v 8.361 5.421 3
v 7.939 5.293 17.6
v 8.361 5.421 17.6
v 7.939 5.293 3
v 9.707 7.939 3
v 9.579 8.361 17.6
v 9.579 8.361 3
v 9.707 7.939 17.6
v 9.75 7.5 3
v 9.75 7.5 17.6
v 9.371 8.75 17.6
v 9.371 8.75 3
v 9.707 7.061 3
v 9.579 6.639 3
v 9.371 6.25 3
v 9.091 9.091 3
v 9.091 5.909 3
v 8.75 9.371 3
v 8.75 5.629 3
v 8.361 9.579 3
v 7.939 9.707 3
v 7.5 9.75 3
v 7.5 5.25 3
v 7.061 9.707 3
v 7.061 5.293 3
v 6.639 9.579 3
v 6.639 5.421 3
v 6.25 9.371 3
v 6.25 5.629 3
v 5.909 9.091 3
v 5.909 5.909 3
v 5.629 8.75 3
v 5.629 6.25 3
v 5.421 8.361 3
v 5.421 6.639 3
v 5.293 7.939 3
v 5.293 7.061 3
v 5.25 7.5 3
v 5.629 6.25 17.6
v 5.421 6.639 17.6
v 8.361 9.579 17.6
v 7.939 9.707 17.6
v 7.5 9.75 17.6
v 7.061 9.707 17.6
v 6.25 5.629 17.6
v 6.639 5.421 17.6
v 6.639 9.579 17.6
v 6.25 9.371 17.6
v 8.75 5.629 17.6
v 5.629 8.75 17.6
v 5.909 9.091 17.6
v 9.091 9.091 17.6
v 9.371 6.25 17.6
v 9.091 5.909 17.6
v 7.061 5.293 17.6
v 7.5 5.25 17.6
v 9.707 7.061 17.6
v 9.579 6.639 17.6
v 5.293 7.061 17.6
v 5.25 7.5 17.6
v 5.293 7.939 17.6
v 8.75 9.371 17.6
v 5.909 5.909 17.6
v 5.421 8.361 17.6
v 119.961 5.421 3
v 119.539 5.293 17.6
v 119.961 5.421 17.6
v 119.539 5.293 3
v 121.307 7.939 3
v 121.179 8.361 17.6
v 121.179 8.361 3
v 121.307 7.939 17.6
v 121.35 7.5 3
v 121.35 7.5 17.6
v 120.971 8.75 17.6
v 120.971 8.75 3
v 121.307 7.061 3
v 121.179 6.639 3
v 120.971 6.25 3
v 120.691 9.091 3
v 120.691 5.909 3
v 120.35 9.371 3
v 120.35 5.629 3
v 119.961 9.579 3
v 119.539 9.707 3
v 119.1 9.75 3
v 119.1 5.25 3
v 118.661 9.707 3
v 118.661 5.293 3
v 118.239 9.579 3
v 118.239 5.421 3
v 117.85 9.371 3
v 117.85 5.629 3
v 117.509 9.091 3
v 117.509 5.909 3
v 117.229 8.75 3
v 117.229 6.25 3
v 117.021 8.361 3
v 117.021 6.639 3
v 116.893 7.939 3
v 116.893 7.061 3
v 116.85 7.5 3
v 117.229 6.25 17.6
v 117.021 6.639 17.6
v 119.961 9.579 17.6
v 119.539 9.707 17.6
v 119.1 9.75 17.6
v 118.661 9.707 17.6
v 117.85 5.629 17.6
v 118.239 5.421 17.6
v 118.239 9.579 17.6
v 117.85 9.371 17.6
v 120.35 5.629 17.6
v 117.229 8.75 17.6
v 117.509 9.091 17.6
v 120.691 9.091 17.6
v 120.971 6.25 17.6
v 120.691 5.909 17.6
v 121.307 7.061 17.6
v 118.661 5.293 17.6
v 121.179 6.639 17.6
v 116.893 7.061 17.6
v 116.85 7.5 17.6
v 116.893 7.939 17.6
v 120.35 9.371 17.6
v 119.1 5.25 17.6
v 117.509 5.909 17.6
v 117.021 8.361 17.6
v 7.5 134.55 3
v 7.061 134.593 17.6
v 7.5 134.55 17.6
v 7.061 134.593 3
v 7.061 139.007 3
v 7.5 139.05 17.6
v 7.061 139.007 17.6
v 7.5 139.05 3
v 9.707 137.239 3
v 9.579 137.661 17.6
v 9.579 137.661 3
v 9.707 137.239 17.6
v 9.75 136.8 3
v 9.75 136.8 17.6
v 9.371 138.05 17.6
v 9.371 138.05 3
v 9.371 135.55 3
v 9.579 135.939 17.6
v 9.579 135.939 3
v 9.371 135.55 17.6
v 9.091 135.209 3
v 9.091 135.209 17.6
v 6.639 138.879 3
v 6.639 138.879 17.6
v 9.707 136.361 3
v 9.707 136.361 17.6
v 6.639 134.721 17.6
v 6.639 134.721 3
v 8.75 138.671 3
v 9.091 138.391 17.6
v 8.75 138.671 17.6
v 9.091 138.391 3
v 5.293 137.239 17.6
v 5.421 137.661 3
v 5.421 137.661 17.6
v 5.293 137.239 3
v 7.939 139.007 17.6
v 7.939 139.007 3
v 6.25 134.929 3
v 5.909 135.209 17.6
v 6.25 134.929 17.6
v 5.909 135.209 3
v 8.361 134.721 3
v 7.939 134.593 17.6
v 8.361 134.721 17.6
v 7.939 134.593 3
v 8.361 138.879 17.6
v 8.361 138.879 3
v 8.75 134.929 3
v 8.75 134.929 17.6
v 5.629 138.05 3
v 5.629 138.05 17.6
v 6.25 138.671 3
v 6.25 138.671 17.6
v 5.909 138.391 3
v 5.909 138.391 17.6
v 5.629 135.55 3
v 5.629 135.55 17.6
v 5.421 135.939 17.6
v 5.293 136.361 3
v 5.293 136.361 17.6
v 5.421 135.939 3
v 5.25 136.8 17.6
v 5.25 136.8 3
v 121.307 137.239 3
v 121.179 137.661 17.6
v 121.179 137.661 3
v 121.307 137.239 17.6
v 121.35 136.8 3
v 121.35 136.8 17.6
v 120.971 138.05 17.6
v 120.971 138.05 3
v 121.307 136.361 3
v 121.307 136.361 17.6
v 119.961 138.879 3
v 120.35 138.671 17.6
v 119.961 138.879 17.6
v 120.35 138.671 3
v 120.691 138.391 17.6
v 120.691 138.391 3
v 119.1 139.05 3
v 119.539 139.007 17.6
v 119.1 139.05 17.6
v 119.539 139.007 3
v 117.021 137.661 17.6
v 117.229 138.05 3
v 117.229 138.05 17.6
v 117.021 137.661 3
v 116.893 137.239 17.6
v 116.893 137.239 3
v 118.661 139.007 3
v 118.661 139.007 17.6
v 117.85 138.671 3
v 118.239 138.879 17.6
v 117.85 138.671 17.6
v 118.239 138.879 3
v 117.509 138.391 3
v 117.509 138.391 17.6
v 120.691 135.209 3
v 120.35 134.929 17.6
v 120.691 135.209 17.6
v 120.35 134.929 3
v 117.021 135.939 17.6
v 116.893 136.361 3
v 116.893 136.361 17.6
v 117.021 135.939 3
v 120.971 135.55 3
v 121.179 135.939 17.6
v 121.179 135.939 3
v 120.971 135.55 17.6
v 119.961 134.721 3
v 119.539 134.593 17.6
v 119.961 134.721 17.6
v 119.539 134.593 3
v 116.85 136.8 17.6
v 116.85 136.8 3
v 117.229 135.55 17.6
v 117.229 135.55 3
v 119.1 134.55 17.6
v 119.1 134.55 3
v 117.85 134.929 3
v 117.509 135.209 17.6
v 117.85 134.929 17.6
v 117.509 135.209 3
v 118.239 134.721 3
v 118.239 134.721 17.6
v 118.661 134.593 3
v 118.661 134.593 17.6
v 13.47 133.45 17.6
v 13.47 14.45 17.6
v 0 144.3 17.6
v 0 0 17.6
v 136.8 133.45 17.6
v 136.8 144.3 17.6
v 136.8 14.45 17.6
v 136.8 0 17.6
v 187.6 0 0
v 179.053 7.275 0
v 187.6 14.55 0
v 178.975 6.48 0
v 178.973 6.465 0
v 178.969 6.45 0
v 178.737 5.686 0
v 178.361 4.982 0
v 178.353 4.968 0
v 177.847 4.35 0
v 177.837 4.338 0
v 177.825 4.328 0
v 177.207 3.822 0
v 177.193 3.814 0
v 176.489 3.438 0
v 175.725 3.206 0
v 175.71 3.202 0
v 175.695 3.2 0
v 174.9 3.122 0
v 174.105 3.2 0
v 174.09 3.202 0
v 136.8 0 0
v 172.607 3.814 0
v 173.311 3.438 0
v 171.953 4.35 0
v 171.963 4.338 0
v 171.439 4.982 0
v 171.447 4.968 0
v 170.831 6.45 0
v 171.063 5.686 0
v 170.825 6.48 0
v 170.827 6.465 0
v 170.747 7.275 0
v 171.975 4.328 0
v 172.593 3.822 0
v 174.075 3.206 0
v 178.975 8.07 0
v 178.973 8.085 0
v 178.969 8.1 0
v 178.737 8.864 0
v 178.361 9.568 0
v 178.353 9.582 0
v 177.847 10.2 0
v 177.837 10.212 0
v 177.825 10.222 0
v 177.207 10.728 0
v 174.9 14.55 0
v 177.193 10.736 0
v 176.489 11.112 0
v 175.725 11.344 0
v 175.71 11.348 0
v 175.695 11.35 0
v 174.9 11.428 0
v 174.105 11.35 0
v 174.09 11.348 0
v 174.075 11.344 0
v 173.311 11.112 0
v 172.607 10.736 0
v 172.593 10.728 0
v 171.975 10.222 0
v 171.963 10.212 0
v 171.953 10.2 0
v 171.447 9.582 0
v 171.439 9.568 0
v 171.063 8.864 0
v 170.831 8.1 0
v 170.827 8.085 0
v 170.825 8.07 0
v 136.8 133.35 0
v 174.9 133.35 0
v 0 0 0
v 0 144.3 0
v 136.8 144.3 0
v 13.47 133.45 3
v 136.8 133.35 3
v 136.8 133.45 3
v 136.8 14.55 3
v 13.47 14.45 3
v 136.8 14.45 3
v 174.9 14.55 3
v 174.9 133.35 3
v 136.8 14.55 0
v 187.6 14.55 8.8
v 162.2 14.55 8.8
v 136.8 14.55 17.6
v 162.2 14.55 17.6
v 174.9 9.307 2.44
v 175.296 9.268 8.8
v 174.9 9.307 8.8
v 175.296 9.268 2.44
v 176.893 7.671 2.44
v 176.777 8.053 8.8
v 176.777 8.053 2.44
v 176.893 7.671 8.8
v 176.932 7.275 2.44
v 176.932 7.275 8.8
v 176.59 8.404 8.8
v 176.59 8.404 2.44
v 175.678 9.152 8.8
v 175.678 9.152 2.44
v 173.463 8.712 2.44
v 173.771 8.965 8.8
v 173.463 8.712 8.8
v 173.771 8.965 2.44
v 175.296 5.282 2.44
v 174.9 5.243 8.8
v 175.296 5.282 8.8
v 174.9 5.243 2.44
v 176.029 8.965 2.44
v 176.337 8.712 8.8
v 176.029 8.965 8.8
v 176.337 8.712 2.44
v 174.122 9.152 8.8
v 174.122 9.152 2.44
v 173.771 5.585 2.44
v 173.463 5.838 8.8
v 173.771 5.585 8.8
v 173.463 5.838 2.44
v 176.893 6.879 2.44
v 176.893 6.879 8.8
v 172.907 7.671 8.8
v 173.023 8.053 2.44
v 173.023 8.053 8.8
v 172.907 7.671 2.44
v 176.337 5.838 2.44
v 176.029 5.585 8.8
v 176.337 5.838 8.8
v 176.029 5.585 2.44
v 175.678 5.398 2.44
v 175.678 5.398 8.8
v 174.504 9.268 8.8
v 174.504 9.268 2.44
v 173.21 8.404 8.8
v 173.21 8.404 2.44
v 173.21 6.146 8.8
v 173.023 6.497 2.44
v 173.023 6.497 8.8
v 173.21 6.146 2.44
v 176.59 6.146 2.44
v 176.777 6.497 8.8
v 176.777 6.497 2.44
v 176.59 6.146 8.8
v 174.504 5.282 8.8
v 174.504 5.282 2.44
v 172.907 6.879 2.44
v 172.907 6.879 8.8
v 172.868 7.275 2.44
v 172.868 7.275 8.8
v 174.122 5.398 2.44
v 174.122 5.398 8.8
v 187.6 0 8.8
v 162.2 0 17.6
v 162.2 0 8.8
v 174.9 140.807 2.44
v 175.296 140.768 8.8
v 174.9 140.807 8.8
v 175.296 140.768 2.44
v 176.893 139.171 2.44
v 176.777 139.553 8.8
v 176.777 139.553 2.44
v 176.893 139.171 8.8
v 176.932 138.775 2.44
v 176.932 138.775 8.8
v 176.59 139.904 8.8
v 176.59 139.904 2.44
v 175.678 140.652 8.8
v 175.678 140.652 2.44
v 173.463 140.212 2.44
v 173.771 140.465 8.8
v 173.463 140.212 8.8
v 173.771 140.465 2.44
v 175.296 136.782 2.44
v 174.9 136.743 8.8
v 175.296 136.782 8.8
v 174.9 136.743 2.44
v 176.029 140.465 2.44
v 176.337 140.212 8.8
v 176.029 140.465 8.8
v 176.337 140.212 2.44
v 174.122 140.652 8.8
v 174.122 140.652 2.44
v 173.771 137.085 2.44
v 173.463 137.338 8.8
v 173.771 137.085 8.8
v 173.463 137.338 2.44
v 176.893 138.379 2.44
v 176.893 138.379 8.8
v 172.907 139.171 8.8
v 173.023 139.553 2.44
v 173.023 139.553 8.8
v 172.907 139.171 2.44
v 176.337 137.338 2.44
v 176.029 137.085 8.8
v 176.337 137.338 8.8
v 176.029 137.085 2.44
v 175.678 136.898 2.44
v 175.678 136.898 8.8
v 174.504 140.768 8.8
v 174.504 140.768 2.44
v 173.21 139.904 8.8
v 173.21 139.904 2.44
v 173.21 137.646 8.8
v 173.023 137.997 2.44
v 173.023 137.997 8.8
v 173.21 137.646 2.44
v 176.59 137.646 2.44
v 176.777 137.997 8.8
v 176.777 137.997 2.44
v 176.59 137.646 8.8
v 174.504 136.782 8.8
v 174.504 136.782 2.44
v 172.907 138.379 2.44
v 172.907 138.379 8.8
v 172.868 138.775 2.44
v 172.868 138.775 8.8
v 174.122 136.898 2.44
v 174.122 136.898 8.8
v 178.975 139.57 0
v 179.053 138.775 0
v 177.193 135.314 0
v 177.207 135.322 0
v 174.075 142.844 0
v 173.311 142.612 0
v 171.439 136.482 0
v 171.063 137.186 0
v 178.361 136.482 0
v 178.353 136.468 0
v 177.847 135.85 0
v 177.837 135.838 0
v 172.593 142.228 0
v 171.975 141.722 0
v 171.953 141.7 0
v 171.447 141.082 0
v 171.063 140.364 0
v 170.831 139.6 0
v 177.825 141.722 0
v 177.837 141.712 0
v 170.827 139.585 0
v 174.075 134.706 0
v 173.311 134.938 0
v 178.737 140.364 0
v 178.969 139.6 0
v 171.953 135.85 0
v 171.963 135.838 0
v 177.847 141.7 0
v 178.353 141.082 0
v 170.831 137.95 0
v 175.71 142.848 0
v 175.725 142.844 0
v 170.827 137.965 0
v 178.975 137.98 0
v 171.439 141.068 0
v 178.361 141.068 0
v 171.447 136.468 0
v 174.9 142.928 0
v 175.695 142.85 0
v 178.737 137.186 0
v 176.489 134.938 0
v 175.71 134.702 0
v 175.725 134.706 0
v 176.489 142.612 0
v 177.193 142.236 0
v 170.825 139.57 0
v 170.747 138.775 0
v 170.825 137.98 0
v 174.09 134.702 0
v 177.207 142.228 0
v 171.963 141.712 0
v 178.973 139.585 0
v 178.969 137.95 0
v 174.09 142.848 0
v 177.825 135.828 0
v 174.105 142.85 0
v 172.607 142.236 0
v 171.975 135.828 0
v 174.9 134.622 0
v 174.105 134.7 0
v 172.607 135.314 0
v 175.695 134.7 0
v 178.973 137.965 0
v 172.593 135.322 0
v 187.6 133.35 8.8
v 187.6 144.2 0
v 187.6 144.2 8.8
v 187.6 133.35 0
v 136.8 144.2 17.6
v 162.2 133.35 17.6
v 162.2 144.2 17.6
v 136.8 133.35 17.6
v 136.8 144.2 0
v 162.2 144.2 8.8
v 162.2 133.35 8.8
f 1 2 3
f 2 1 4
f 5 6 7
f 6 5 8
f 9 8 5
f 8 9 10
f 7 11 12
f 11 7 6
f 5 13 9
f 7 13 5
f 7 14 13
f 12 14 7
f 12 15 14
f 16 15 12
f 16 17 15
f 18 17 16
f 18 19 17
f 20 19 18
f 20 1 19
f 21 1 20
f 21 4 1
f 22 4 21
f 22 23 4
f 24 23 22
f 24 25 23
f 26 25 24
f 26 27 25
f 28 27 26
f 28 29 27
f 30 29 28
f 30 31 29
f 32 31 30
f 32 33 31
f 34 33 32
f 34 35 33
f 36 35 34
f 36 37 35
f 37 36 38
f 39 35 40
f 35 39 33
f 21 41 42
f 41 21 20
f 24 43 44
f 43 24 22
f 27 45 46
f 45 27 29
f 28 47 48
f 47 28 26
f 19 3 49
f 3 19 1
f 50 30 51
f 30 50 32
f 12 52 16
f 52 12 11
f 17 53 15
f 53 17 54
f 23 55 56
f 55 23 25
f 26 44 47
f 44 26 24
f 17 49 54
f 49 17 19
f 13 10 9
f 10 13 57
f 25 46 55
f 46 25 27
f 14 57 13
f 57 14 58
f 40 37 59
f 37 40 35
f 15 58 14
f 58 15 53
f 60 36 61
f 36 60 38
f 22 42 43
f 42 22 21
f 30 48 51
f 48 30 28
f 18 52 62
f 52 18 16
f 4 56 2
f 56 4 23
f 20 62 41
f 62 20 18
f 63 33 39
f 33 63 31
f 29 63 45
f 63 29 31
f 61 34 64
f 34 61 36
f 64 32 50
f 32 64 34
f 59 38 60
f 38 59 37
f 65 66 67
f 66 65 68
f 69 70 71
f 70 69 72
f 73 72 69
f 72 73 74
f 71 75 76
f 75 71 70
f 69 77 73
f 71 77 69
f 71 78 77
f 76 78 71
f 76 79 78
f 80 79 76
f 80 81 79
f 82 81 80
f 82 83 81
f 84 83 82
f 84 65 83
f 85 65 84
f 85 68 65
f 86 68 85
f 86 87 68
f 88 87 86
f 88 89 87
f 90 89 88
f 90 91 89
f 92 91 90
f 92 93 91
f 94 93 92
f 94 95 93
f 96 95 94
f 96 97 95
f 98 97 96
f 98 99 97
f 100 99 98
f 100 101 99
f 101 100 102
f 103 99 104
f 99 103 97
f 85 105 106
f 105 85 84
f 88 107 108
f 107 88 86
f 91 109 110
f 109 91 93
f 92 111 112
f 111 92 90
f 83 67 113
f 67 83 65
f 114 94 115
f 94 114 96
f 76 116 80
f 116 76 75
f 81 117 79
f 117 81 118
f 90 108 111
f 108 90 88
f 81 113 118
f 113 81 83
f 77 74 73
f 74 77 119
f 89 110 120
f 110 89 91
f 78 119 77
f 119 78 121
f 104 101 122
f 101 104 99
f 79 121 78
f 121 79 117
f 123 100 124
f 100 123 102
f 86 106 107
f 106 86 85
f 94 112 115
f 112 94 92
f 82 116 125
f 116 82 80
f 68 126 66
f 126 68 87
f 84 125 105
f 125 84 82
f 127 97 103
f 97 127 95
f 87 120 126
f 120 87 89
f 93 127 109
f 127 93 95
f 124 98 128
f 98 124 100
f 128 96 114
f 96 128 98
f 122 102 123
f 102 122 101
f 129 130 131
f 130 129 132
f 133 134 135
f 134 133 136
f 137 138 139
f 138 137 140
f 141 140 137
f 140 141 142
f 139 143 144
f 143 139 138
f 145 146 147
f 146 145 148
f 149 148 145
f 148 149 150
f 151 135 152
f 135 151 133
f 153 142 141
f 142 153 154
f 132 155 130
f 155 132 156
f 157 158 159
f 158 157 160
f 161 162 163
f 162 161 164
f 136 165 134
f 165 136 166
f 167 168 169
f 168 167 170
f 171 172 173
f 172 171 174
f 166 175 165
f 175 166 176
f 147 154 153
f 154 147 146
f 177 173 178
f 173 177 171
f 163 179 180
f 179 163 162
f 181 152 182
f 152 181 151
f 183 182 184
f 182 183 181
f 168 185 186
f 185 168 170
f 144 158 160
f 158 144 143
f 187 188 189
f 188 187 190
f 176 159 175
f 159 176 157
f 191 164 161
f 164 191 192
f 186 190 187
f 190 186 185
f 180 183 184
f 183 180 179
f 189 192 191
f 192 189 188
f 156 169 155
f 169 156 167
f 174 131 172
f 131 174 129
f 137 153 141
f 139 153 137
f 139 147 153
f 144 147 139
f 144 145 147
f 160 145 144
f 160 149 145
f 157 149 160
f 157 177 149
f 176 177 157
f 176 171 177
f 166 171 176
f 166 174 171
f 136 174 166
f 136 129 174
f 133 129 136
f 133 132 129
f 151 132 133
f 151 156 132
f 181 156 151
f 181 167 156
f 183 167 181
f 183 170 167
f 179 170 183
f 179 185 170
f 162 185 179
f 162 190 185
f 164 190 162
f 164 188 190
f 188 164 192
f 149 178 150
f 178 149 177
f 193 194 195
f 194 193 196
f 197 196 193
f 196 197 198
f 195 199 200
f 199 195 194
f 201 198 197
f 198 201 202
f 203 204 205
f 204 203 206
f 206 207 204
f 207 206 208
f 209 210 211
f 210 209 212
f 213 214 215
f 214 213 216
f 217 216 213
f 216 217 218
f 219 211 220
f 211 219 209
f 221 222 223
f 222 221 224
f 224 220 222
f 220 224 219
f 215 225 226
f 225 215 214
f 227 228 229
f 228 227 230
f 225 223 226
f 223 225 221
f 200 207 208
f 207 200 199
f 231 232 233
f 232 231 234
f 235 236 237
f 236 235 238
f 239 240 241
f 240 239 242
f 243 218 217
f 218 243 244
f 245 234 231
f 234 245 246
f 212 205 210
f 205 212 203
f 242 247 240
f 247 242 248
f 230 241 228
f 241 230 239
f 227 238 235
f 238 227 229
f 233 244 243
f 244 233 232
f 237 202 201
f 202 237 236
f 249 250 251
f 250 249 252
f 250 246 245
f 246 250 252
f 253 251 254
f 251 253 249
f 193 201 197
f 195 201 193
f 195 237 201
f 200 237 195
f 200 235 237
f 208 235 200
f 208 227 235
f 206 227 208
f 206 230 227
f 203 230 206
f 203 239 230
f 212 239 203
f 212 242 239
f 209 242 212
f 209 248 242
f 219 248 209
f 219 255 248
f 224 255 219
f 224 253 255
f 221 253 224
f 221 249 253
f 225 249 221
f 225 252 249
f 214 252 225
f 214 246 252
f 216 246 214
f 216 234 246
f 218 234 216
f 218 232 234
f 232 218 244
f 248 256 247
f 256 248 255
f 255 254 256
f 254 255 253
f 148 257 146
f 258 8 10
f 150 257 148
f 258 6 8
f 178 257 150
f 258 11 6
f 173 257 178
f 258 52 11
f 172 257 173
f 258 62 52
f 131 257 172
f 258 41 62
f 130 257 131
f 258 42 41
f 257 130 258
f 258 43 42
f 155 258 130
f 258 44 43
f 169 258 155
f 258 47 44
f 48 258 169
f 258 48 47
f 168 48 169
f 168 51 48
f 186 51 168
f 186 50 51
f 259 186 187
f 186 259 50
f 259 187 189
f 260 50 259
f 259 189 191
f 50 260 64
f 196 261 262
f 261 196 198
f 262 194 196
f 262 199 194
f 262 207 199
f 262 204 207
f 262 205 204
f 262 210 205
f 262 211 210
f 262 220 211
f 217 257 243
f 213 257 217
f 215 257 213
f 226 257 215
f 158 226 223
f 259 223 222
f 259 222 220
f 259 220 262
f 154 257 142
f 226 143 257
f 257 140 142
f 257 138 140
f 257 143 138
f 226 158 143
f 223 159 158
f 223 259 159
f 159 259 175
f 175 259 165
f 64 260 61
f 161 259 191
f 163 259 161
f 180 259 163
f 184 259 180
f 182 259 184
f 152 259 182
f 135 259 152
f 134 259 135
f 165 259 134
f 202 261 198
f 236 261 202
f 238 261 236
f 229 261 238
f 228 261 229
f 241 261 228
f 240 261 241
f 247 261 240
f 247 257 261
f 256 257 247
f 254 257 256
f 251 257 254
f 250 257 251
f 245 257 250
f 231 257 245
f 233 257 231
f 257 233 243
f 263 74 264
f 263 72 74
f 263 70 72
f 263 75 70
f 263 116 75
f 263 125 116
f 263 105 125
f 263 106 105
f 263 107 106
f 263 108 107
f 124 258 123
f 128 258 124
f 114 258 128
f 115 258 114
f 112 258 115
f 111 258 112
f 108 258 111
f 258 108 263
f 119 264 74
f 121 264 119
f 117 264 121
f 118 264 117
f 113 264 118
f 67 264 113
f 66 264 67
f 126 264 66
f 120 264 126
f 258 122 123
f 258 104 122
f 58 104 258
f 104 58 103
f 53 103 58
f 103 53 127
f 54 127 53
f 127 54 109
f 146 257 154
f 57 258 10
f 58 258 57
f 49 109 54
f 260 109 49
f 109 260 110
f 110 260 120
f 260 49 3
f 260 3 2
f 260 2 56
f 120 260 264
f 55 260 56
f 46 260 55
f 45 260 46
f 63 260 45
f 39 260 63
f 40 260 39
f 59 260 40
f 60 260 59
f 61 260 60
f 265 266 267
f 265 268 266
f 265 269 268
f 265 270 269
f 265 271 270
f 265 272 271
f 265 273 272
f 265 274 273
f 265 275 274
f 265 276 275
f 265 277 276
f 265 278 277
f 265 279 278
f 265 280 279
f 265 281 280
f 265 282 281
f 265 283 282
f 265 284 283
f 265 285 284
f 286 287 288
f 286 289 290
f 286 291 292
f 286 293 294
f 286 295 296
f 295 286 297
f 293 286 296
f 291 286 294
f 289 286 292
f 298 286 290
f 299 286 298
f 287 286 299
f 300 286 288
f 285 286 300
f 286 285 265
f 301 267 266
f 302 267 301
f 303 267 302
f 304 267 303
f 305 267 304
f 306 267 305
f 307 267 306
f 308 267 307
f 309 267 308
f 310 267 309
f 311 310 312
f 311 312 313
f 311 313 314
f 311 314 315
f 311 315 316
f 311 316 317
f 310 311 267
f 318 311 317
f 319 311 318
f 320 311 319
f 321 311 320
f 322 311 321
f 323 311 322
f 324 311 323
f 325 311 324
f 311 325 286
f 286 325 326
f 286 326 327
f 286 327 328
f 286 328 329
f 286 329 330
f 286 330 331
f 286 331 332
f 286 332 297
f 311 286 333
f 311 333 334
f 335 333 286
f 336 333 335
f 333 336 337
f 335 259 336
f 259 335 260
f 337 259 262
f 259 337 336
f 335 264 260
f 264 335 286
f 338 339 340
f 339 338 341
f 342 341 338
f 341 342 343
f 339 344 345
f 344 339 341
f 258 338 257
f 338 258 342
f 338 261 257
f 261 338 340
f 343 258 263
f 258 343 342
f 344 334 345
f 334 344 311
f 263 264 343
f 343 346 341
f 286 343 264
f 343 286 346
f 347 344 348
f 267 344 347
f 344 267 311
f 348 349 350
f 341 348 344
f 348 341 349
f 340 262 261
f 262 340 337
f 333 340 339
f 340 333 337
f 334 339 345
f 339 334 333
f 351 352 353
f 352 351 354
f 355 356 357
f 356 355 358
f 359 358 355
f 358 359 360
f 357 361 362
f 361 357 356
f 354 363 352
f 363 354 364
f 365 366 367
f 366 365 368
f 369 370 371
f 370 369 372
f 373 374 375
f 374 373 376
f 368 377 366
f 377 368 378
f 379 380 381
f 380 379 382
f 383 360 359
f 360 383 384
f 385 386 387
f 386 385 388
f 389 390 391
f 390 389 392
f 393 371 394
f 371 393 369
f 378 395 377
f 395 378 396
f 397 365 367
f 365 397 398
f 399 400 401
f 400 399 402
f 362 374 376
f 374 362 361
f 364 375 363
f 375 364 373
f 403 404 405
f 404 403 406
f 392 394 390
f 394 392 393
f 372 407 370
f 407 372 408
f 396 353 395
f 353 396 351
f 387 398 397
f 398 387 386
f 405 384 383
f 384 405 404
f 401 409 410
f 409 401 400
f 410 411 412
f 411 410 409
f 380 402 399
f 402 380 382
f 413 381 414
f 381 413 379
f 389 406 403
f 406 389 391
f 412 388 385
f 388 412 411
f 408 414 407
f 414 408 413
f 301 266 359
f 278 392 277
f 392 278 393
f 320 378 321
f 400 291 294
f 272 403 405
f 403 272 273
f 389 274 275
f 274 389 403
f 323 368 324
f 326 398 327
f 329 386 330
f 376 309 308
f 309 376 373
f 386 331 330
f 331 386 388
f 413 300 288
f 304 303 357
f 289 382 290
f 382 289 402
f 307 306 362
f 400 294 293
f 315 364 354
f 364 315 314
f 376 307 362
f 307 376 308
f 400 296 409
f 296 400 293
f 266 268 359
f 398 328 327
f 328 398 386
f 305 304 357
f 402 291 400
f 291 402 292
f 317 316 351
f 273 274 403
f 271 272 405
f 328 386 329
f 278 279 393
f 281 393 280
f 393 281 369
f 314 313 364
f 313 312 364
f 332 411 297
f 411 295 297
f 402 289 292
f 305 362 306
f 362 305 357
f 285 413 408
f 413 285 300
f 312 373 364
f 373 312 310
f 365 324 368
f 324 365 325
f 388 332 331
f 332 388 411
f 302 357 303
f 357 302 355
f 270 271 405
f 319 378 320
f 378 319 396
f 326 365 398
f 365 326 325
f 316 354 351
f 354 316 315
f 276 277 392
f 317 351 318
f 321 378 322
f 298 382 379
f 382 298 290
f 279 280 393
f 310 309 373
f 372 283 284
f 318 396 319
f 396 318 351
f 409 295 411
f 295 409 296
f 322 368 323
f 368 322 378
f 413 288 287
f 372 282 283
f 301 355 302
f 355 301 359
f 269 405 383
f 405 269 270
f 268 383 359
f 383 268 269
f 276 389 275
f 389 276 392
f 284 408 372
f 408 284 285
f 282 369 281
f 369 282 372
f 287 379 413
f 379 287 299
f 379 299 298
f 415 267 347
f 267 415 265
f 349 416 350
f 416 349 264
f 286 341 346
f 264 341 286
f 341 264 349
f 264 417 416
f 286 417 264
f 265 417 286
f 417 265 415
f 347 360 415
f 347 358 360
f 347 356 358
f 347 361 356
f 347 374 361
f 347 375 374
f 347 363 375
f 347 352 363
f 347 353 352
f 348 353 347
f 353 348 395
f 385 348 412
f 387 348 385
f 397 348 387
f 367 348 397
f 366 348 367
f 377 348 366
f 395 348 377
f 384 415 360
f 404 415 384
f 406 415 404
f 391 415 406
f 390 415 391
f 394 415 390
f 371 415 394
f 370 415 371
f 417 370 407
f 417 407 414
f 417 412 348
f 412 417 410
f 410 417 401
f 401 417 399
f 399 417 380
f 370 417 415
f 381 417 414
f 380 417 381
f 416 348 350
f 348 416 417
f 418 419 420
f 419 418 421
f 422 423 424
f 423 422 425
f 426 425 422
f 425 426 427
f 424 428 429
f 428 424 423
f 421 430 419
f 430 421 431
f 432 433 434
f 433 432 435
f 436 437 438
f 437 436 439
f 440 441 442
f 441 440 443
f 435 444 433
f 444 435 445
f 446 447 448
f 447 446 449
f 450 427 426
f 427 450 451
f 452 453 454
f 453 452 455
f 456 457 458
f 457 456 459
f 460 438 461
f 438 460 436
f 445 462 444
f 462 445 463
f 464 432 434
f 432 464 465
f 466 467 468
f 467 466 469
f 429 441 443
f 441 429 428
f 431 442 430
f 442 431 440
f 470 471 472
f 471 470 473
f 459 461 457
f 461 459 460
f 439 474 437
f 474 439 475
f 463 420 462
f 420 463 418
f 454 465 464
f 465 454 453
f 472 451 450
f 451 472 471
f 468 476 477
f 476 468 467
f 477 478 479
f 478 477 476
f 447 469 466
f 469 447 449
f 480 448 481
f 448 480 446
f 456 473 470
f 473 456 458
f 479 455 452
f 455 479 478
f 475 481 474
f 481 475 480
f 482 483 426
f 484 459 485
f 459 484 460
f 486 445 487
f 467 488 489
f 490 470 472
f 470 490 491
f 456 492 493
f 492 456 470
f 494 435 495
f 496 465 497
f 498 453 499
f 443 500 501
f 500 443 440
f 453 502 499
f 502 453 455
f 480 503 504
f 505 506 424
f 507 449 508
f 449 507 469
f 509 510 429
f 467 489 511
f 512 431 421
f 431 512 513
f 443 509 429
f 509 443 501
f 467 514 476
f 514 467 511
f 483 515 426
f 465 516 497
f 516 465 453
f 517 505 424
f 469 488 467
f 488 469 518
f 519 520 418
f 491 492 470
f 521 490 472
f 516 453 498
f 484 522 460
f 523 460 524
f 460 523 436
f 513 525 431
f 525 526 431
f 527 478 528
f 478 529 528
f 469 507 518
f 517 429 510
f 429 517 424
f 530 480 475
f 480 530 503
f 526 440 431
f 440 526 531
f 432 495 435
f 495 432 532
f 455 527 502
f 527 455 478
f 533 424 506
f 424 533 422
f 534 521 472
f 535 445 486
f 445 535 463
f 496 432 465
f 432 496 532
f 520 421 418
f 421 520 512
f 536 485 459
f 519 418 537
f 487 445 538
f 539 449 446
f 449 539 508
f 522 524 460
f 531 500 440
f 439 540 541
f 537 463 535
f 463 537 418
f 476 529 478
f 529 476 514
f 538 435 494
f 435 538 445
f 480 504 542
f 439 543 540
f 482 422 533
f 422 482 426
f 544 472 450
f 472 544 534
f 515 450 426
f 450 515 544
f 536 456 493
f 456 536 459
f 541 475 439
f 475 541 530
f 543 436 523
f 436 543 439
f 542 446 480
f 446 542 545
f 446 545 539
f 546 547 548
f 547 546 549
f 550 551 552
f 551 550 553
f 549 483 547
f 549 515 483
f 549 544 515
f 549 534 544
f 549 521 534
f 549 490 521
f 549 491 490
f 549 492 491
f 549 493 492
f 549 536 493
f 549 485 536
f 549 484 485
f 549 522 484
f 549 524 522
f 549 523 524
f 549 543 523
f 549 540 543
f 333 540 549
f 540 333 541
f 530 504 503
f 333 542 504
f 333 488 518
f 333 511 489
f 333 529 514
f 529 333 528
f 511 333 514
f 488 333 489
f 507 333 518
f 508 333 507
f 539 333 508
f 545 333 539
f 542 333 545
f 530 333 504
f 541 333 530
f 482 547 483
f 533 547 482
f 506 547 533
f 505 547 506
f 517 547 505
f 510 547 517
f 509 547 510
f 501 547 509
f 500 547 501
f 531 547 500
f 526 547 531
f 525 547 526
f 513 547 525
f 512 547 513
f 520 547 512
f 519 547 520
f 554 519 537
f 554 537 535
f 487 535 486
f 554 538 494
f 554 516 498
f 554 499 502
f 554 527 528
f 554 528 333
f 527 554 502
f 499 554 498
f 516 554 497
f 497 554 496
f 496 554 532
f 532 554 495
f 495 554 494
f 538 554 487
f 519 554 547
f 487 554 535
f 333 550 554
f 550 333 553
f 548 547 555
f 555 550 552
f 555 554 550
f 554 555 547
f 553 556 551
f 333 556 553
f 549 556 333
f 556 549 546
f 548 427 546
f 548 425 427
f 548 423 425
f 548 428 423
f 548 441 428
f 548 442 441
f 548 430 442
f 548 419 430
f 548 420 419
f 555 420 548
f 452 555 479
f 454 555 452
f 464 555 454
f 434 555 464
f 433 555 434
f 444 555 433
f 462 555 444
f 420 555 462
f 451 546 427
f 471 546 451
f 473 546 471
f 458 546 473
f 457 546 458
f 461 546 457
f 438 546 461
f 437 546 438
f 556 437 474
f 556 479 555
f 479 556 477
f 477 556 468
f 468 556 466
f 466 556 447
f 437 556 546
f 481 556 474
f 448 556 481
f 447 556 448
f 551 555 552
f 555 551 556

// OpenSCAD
// file: joint.scad
//
// create overlap joint
//
// joint( w, l, h, right, clear, tap)
//   create (one half of) an overlap joint with drilled holes
//
//   (w, l, h) are (x, y, z) size of entire joint
//   right=true specifies right size
//   (clear, tap) are hole diameters (thru hole from bottom on left side)
//
// (expects mm=25.4)

joint_e = 0.1;

joint_cs_dep = 0.1*mm;		/* countersink depth */
joint_cs_angle = 82;		/* countersink angle */

// make an "ell" for a joint
// size:  wid, leng, dep
// hole:  dia = diameter, outside=1 for start outside, pct = percent to drill
module joint_ell( wid, leng, dep, dia, outside, pct) {
     difference() {
	  cube( [wid, leng, dep]);
	  translate( [wid/2, -e, dep/2])
	       cube( [wid/2+joint_e, leng+2*e, dep/2+joint_e]);
	  // deal with the hole
	  if( outside) {
	       translate( [3*wid/4, leng/2, -e]) {
		    cylinder( d=dia, h = (((pct/2)+1)/100+joint_e)*dep);
		    // countersink
		    ang = 90-joint_cs_angle/2;
		    d_rad = joint_cs_dep/tan(ang);
		    cylinder( d1=dia+2*d_rad, d2=dia, h=joint_cs_dep);
	       }
	  } else {
	       translate( [3*wid/4, leng/2, (dep/2)*(((100-pct)+1)/100)-e])
		    cylinder( d=dia, h = dep/2+2*e);
	  }
     }
}

module joint_flip( wid, leng, dep, flip, dia, outside, pct) {
     if( flip ) {
	  joint_ell( wid, leng, dep, dia, flip, pct);
     } else {
	  translate( [wid, 0, dep])
	       rotate( [180, 0, 180])
	       joint_ell( wid, leng, dep, dia, flip, pct);
     }
}

module joint( w, l, h, right, clear, tap) {
     if( right) {
	  joint_flip(2*w/3, l, h, true, clear, 1, 100);
     } else {
	  joint_flip( 2*w/3, l, h, false, tap, 0, 75);
     }
}
// main file
//
// 84 key keyboard case
//

mm = 25.4;
$fn = 32;
e = 0.1;

include <joint.scad>

hgt = 5.1;  // plate height

// set to 0 for normal size
//shrink_x = 270;
//shrink_y = 100;
shrink_x = 0;
shrink_y = 0;

// plate dims from DXF
pwid = 344.8-shrink_x;
plen = 139.3-shrink_y;
pthk = 1.5;			/* thickness CHECKME */

hole_off = 5;			/* hole offset from edge */
hole_dx = 111.6;
hole_dia = 4.5;			/* 8-32 clearance hole */

// holes for #6 screws to join case halves
clear = 0.16*mm;
tap = 0.125*mm;

// pcb dims from layout
pcb_wid = 323-shrink_x;
pcb_len = 117-shrink_y; 
pcb_thk = 1.6;

case_pcb_clear = 1;

// position of lower left switch WRT item LL corner
pcb_ll_x = 29.94;
pcb_ll_y = 11.57;
plate_ll_x = 41.91;
plate_ll_y = 24.52;

case_pcb_dx = plate_ll_x - pcb_ll_x;
case_pcb_dy = plate_ll_y - pcb_ll_y;


// case details
case_A = 2.5;			/* case extend beyond plate */
case_B = 1;			/* clearance around PCB */
case_D = 3;			/* base thickness */
case_E = 8;			/* PCB clearance */

// overall case size
case_wid = pwid + 2*case_A;
case_len = plen + 2*case_A;
case_hgt = case_D + case_E + pcb_thk + 5;

// top and bottom case margins for joints
case_bot_marg = case_pcb_dy-case_pcb_clear+case_A;
case_top_marg = case_len-(pcb_len+2*case_pcb_clear)-case_bot_marg;

echo("Top Marg: ", case_top_marg);

module case() {
     translate( [case_A, case_A, 0])
	  difference() {
	       translate( [-case_A, -case_A, 0])
		    cube( [case_wid, case_len, case_hgt]);
	       translate( [case_pcb_dx-case_pcb_clear, case_pcb_dy-case_pcb_clear, case_D])
		    cube( [pcb_wid + 2*case_pcb_clear, pcb_len + 2*case_pcb_clear, 20]);
	       translate( [0, 0, case_D])
		    mtg_holes();

	  }
//     }
}

// draw real plate or fake plate if shrinking
module plate() {
     if( shrink_x == 0) {
	  translate( [case_A-38, case_A+plen+35, pcb_thk+5+(case_E+case_D)])
	       import("plate.stl",10);
     } else {
	  translate( [case_A, case_A, pcb_thk+5+(case_E+case_D)]) 
	  cube( [pwid, plen, pthk]);
     }
}

module board() {
     if( shrink_x == 0) {
	  translate( [case_A-15.1, case_A+plen+35.1, case_E+case_D])
	       import("kb_test_big.stl",10);
     } else {
	  translate( [case_A+case_pcb_dx, case_A+case_pcb_dy, case_E+case_D])
	  cube( [pcb_wid, pcb_len, pcb_thk]);
     }
}

module hole_at(x,y) {
     translate( [x, y, 0])
	  cylinder( d=hole_dia, h=40);
}

module mtg_holes() {
     for( y=[hole_off, plen-hole_off]) {
	  hole_at( hole_off, y);
	  hole_at( hole_off+hole_dx, y);
	  hole_at( hole_off+2*hole_dx, y);
	  hole_at( pwid-hole_off, y);
     }
}


module render() {
     color("lightblue") plate();
     color("brown") board();
     % case();
}

// test joint
//  color("blue") joint( w, l, h, false, clear, tap);
//  color("red")  joint( w, l, h, true, clear, tap);

module case_split( right) {
     difference() {
	  case();
	  if( right) {
	       translate( [-e, -e, -e])
		    cube( [case_wid/2+2*e, case_len+2*e, case_hgt+2*e]);
	  } else {
	       translate( [case_wid/2, -e, -e])
		    cube( [case_wid/2+2*e, case_len+2*e, case_hgt+2*e]);
	  }
     }
}

joint_wid = 3*mm;

module case_right_joint() {
     difference() {
	  case_split( true);
	  translate( [case_wid/2-(joint_wid/6), -e, -e])
	       cube( [joint_wid*2/3, case_bot_marg+2*e, case_hgt+2*e]);
	  translate( [case_wid/2-(joint_wid/6), case_len-case_top_marg-e, -e])
	       cube( [joint_wid*2/3, case_top_marg+2*e, case_hgt+2*e]);
     }
     translate( [case_wid/2-(joint_wid/6), 0, 0])
	  joint( joint_wid, case_bot_marg+e, case_hgt, false, clear, tap);
     translate( [case_wid/2-(joint_wid/6), case_len-case_top_marg-e, 0])
	  joint( joint_wid, case_top_marg, case_hgt, false, clear, tap);
}

module case_left_joint() {
     difference() {
	  case_split( false);
	  translate( [case_wid/2-joint_wid/2, -e, -e])
	       cube( [joint_wid*2/3, case_bot_marg+2*e, case_hgt+2*e]);
	  translate( [case_wid/2-joint_wid/2, case_len-case_top_marg-e, -e])
	       cube( [joint_wid*2/3, case_top_marg+2*e, case_hgt+2*e]);
     }
      translate( [case_wid/2-joint_wid/2, 0, 0])
 	  joint( joint_wid, case_bot_marg+e, case_hgt, true, clear, tap);
      translate( [case_wid/2-joint_wid/2, case_len-case_top_marg-e, 0])
 	  joint( joint_wid, case_top_marg, case_hgt, true, clear, tap);
}

//render();

//case_right_joint();

case_left_joint();
